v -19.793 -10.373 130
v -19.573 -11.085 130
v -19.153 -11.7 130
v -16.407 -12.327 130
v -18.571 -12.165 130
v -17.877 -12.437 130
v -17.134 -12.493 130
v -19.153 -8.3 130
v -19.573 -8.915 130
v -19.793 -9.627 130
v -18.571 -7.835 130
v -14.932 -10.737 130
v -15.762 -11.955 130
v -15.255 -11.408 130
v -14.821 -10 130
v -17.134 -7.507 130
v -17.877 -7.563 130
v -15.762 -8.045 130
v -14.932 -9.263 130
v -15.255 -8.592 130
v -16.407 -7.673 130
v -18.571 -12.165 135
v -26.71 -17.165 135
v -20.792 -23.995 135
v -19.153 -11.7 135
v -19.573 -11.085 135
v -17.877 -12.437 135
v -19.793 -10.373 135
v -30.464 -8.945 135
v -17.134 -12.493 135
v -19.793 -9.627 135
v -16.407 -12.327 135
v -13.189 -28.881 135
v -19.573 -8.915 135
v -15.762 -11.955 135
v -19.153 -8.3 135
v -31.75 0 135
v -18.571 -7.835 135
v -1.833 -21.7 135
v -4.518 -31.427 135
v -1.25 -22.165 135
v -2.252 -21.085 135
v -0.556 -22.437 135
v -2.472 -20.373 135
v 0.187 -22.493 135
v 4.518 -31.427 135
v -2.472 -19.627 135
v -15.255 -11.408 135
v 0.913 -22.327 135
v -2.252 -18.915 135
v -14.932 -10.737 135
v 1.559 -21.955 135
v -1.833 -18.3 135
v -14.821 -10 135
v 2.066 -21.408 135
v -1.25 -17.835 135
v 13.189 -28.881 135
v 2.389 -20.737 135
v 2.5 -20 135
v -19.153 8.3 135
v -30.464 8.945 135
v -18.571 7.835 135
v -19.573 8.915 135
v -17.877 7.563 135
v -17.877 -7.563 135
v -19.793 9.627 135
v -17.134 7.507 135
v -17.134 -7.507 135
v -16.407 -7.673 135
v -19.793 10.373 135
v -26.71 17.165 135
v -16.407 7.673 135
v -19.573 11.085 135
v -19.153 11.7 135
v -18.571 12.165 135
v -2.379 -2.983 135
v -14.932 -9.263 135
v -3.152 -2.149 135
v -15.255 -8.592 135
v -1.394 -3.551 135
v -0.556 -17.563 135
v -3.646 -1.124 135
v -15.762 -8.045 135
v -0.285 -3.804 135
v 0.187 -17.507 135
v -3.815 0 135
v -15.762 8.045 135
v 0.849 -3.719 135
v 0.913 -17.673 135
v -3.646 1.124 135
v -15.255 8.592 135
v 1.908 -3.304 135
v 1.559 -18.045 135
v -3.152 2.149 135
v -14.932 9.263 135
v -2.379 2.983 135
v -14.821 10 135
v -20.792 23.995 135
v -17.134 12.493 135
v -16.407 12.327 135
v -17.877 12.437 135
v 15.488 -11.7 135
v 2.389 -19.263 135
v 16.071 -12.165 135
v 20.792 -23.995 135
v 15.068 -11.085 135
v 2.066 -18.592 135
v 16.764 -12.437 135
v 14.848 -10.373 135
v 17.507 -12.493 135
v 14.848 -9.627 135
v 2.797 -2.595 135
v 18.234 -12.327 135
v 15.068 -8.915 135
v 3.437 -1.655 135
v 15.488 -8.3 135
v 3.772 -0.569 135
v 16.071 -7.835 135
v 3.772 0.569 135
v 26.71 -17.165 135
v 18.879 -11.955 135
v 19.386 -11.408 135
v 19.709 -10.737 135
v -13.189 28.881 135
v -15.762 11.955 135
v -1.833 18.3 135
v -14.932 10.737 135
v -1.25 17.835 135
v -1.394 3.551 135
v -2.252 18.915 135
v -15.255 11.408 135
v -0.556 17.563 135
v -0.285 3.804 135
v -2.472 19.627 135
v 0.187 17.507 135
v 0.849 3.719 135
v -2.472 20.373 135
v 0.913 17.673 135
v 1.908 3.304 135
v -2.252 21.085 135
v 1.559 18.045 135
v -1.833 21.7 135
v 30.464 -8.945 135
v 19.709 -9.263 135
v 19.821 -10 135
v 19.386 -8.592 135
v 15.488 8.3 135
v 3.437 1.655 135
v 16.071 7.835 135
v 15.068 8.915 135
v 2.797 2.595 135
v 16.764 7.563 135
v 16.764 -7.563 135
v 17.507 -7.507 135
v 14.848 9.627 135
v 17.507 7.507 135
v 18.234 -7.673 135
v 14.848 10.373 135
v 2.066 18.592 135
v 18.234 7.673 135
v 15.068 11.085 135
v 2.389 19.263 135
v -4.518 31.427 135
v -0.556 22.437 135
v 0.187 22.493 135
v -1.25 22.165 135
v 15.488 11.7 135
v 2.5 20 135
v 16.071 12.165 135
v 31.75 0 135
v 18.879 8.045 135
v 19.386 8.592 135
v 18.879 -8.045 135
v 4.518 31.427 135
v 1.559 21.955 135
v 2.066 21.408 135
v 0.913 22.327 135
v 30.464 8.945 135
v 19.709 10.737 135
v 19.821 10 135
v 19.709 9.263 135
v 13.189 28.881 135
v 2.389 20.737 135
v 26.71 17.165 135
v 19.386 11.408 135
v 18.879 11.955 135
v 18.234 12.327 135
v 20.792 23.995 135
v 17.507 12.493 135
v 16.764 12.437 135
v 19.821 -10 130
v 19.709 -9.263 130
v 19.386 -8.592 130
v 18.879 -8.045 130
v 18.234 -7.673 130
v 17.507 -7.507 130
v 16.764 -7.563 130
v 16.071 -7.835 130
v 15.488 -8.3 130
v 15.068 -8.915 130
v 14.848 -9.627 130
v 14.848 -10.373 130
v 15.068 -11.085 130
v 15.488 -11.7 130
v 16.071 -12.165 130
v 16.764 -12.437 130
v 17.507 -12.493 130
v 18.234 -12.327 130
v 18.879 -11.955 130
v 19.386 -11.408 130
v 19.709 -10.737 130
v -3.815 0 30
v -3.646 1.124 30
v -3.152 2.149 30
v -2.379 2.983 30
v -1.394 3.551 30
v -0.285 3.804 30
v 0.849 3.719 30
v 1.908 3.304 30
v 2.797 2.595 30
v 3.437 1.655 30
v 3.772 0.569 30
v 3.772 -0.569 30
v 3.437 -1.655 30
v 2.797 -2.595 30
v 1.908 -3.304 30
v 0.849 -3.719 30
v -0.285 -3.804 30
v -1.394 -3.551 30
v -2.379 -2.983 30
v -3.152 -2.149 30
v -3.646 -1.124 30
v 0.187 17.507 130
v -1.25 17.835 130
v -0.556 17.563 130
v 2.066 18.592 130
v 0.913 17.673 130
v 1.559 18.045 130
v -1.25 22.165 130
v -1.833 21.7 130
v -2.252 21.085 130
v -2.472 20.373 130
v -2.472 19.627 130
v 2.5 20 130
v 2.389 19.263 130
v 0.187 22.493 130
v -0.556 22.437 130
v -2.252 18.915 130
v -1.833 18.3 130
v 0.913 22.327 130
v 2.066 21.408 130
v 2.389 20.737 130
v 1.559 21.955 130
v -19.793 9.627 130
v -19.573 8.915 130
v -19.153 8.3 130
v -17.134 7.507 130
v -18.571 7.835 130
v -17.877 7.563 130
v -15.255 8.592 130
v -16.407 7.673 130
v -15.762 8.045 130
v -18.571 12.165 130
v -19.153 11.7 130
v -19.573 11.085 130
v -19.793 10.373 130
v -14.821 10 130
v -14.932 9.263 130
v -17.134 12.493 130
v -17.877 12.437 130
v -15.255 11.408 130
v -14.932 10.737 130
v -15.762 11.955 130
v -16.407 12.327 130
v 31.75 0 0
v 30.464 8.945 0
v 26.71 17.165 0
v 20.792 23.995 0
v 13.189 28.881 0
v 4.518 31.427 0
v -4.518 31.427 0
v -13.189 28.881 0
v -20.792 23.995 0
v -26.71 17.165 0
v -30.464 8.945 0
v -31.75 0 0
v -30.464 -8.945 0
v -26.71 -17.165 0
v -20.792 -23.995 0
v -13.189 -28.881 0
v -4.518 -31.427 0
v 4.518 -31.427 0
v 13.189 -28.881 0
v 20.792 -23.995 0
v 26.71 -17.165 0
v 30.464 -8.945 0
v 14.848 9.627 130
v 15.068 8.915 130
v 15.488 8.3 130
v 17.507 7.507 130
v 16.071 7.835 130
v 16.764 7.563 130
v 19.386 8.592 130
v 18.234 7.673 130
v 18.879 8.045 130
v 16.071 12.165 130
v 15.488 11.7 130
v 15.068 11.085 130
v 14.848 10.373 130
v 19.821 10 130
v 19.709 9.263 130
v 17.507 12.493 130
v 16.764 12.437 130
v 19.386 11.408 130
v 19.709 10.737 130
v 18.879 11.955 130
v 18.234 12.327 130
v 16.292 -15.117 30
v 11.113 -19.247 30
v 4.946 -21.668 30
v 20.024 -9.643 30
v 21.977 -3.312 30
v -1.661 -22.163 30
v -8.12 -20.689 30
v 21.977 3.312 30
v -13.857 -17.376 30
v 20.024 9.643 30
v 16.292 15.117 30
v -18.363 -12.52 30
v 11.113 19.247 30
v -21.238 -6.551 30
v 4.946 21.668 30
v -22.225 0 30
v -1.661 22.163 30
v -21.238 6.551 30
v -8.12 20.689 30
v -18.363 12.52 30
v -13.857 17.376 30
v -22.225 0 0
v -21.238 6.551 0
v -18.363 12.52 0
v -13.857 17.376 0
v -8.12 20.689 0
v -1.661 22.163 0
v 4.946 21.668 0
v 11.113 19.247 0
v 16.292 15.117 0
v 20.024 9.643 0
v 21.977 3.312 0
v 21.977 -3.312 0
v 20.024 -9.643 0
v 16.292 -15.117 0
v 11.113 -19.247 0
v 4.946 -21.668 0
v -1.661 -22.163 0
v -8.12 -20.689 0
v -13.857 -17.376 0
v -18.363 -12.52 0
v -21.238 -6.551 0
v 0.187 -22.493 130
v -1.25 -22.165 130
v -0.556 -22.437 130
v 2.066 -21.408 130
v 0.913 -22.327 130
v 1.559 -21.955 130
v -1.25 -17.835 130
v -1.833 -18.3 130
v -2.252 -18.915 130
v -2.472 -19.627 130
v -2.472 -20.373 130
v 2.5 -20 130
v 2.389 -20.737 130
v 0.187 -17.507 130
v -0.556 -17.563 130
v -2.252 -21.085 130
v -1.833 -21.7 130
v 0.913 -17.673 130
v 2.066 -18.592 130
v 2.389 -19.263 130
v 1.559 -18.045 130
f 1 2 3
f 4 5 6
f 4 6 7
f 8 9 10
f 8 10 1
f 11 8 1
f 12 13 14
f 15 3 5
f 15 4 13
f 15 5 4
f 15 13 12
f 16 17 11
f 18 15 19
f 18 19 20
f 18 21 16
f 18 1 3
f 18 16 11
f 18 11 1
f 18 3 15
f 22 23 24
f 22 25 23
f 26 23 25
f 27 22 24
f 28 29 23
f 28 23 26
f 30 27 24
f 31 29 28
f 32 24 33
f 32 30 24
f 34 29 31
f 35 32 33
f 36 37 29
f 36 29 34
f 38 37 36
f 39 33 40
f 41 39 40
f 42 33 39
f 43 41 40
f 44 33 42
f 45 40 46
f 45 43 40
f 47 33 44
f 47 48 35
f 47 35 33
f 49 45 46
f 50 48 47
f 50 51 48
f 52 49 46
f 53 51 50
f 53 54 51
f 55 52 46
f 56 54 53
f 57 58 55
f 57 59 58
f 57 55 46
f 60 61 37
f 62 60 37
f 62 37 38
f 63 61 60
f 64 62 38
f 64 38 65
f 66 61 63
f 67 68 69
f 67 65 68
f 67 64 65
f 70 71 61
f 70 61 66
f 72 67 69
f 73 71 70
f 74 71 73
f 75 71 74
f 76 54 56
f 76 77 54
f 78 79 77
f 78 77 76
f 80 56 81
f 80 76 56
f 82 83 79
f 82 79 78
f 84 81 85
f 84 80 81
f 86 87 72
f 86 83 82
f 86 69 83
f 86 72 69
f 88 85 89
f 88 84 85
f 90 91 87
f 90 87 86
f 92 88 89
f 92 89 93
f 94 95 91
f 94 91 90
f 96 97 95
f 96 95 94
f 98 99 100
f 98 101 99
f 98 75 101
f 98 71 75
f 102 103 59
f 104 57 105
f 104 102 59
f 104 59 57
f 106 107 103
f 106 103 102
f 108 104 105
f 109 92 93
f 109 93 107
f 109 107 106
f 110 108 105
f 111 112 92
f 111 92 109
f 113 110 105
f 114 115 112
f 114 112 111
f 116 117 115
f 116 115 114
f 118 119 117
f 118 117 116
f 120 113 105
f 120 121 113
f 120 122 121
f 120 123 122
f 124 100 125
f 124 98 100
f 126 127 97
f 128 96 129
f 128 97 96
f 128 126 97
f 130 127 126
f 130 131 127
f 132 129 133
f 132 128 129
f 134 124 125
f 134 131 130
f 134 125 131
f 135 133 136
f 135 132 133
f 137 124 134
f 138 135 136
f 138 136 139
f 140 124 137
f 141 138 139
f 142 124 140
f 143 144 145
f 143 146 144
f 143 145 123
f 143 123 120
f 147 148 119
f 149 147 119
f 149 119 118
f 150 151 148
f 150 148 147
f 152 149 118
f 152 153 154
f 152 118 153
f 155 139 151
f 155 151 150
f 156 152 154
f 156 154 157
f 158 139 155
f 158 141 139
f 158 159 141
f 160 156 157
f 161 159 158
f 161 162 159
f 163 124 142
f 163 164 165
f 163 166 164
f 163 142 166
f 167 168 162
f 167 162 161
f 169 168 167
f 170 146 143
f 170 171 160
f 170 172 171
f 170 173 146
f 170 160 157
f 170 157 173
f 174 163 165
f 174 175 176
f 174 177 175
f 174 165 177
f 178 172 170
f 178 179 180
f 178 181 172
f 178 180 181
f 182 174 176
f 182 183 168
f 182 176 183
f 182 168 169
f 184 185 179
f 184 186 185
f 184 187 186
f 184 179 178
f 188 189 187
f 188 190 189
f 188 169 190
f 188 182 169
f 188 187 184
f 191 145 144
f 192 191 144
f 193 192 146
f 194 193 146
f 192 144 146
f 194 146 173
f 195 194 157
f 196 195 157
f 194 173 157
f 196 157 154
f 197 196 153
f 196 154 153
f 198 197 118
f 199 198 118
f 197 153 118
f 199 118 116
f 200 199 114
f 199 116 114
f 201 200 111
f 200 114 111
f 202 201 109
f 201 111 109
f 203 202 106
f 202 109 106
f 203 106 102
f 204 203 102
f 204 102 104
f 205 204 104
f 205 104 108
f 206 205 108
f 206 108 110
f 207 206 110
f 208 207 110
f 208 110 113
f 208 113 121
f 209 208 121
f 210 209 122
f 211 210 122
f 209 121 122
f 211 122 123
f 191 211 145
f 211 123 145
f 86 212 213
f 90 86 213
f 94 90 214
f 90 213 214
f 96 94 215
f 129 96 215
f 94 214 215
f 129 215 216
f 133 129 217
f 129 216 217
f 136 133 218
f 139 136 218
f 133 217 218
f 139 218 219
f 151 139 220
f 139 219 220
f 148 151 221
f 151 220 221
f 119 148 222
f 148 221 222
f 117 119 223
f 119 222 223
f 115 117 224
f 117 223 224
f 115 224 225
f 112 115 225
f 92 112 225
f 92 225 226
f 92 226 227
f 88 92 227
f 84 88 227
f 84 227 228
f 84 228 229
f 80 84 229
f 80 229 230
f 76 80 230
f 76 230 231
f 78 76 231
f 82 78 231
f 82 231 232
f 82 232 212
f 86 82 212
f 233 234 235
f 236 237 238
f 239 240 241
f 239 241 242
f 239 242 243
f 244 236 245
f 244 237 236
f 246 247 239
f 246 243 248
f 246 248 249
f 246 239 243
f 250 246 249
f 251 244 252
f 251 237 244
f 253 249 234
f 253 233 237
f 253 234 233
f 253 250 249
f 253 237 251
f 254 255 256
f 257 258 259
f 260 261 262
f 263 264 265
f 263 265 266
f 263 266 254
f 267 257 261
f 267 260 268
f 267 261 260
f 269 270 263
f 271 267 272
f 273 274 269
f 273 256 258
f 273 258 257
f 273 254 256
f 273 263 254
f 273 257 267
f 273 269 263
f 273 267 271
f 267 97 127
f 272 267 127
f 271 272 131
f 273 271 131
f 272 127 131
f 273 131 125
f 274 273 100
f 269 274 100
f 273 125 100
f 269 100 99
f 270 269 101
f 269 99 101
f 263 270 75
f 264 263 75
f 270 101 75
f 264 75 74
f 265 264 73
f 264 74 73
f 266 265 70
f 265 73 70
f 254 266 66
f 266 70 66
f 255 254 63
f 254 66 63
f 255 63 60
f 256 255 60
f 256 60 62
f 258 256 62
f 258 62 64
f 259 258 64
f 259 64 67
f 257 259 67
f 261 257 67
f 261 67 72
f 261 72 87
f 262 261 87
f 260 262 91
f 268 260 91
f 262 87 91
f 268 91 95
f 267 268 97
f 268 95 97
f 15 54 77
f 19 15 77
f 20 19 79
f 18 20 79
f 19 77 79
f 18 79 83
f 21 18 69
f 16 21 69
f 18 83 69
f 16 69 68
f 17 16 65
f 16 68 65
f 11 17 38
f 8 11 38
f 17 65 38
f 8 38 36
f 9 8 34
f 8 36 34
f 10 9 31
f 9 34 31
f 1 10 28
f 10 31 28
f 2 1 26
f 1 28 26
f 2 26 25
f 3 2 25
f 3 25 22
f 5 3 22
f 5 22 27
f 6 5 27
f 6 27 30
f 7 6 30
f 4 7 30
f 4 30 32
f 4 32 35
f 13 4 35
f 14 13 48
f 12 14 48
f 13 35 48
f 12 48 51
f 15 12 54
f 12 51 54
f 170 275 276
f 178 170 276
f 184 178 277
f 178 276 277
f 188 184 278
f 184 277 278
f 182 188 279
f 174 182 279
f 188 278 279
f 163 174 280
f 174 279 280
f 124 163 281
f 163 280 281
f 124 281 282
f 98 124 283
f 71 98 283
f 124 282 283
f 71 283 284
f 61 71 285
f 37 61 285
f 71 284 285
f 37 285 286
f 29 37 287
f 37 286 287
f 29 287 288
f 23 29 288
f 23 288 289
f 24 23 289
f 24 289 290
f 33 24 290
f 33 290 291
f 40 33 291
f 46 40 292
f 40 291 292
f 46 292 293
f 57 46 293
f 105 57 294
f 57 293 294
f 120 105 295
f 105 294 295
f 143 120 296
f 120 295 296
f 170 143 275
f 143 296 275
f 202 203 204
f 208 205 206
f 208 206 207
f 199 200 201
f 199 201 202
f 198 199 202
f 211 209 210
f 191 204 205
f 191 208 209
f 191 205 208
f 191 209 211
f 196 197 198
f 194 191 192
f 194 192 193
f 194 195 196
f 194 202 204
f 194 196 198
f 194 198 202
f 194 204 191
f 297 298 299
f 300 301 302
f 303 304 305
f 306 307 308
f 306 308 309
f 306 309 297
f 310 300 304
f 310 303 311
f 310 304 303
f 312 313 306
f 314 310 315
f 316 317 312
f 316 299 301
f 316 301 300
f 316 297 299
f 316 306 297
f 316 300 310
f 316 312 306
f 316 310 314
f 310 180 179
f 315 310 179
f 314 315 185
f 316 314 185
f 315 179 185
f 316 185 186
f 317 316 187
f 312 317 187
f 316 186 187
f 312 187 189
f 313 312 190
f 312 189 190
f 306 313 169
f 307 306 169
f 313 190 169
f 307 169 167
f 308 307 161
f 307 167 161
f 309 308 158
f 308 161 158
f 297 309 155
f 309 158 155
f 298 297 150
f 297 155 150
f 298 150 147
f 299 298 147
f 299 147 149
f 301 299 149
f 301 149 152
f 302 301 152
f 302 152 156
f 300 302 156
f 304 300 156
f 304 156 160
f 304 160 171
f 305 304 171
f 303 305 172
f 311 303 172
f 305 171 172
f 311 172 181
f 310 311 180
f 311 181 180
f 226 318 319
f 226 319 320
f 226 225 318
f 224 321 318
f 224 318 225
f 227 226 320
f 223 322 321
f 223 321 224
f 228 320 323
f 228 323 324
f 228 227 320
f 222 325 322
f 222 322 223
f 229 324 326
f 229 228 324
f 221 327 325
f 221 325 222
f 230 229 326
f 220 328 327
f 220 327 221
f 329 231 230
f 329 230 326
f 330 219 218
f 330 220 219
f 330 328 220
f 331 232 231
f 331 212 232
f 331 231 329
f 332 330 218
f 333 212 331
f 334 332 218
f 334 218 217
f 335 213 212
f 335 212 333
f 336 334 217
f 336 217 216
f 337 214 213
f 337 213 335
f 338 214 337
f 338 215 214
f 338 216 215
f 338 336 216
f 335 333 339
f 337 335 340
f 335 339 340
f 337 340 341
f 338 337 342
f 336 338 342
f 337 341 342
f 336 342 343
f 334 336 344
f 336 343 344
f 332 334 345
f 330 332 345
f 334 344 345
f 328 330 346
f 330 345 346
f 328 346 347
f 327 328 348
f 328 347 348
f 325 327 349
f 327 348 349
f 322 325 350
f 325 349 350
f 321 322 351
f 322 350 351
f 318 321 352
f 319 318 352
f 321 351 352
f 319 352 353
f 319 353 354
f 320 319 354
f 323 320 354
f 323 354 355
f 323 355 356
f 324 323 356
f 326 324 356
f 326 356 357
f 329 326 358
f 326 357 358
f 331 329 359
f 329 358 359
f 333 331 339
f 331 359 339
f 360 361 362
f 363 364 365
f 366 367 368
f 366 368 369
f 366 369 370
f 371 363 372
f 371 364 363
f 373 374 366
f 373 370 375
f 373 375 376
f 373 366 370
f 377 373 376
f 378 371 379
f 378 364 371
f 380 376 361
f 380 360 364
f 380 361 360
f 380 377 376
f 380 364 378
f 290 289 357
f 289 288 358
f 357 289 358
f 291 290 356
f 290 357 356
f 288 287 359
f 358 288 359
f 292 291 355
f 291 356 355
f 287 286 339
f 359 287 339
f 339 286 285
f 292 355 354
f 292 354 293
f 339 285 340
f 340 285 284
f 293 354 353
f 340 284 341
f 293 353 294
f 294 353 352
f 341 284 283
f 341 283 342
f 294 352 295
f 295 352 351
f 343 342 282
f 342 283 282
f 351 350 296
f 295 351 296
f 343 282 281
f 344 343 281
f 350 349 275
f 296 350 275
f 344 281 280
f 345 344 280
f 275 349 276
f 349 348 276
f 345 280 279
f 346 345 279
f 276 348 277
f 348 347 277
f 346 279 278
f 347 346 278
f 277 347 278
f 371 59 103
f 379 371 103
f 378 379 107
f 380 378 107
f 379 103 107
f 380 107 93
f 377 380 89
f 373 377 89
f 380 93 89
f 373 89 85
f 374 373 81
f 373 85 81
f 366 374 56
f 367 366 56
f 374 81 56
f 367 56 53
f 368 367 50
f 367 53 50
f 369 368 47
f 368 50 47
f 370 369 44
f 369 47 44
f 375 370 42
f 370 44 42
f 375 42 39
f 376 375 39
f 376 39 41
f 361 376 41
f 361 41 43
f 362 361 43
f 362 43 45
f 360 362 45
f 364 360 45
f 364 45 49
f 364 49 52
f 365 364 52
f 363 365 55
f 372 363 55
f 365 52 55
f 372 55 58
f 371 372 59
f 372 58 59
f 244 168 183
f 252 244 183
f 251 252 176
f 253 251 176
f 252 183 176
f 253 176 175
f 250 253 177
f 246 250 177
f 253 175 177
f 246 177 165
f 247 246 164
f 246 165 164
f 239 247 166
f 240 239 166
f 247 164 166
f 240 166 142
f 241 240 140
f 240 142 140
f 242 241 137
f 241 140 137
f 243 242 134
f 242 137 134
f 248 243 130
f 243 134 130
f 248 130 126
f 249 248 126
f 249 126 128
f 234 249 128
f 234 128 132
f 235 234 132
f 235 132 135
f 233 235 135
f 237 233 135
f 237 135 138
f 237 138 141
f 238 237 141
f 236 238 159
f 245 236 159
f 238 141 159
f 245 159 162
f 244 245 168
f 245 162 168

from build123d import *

# Parameters (mm, degrees)
SKETCH2_R           = 31.75
BOSS_EXTRUDE1_DEPTH = 135
SKETCH3_R           = 3.815
CUT_EXTRUDE1_DEPTH  = 135
SKETCH5_R           = 22.225
CUT_EXTRUDE2_DEPTH  = 30
SKETCH6_R           = 2.5
CUT_EXTRUDE3_DEPTH  = 5
SKETCH6_3_R         = 2.5
CUT_EXTRUDE4_DEPTH  = 5


with BuildPart() as part:
    # Sketch2 → Boss-Extrude1 (new body)
    with BuildSketch(Plane.XY):
        Circle(SKETCH2_R)
    extrude(amount=BOSS_EXTRUDE1_DEPTH)

    # Sketch3 → Cut-Extrude1 (cut)
    with BuildSketch(Plane(origin=(0, 0, 0), x_dir=(-1, 0, 0), z_dir=(0, 0, -1))):
        Circle(SKETCH3_R)
    extrude(amount=-CUT_EXTRUDE1_DEPTH, mode=Mode.SUBTRACT)

    # Sketch5 → Cut-Extrude2 (cut)
    with BuildSketch(Plane(origin=(0, 0, 0), x_dir=(-1, 0, 0), z_dir=(0, 0, -1))):
        Circle(SKETCH5_R)
    extrude(amount=-CUT_EXTRUDE2_DEPTH, mode=Mode.SUBTRACT)

    # Sketch6 → Cut-Extrude3 (cut)
    with BuildSketch(Plane.XY.offset(135)):
        with Locations((0, 20)):
            Circle(SKETCH6_R)
    extrude(amount=-CUT_EXTRUDE3_DEPTH, mode=Mode.SUBTRACT)

    # Sketch6<3> → Cut-Extrude4 (cut)
    with BuildSketch(Plane.XY.offset(135)):
        with Locations((0, 20)):
            Circle(SKETCH6_3_R)
        with Locations((17.320508076, 10)):
            Circle(SKETCH6_3_R)
        with Locations((17.320508076, -10)):
            Circle(SKETCH6_3_R)
        with Locations((0, -20)):
            Circle(SKETCH6_3_R)
        with Locations((-17.320508076, -10)):
            Circle(SKETCH6_3_R)
        with Locations((-17.320508076, 10)):
            Circle(SKETCH6_3_R)
    extrude(amount=-CUT_EXTRUDE4_DEPTH, mode=Mode.SUBTRACT)


solid = part.part
